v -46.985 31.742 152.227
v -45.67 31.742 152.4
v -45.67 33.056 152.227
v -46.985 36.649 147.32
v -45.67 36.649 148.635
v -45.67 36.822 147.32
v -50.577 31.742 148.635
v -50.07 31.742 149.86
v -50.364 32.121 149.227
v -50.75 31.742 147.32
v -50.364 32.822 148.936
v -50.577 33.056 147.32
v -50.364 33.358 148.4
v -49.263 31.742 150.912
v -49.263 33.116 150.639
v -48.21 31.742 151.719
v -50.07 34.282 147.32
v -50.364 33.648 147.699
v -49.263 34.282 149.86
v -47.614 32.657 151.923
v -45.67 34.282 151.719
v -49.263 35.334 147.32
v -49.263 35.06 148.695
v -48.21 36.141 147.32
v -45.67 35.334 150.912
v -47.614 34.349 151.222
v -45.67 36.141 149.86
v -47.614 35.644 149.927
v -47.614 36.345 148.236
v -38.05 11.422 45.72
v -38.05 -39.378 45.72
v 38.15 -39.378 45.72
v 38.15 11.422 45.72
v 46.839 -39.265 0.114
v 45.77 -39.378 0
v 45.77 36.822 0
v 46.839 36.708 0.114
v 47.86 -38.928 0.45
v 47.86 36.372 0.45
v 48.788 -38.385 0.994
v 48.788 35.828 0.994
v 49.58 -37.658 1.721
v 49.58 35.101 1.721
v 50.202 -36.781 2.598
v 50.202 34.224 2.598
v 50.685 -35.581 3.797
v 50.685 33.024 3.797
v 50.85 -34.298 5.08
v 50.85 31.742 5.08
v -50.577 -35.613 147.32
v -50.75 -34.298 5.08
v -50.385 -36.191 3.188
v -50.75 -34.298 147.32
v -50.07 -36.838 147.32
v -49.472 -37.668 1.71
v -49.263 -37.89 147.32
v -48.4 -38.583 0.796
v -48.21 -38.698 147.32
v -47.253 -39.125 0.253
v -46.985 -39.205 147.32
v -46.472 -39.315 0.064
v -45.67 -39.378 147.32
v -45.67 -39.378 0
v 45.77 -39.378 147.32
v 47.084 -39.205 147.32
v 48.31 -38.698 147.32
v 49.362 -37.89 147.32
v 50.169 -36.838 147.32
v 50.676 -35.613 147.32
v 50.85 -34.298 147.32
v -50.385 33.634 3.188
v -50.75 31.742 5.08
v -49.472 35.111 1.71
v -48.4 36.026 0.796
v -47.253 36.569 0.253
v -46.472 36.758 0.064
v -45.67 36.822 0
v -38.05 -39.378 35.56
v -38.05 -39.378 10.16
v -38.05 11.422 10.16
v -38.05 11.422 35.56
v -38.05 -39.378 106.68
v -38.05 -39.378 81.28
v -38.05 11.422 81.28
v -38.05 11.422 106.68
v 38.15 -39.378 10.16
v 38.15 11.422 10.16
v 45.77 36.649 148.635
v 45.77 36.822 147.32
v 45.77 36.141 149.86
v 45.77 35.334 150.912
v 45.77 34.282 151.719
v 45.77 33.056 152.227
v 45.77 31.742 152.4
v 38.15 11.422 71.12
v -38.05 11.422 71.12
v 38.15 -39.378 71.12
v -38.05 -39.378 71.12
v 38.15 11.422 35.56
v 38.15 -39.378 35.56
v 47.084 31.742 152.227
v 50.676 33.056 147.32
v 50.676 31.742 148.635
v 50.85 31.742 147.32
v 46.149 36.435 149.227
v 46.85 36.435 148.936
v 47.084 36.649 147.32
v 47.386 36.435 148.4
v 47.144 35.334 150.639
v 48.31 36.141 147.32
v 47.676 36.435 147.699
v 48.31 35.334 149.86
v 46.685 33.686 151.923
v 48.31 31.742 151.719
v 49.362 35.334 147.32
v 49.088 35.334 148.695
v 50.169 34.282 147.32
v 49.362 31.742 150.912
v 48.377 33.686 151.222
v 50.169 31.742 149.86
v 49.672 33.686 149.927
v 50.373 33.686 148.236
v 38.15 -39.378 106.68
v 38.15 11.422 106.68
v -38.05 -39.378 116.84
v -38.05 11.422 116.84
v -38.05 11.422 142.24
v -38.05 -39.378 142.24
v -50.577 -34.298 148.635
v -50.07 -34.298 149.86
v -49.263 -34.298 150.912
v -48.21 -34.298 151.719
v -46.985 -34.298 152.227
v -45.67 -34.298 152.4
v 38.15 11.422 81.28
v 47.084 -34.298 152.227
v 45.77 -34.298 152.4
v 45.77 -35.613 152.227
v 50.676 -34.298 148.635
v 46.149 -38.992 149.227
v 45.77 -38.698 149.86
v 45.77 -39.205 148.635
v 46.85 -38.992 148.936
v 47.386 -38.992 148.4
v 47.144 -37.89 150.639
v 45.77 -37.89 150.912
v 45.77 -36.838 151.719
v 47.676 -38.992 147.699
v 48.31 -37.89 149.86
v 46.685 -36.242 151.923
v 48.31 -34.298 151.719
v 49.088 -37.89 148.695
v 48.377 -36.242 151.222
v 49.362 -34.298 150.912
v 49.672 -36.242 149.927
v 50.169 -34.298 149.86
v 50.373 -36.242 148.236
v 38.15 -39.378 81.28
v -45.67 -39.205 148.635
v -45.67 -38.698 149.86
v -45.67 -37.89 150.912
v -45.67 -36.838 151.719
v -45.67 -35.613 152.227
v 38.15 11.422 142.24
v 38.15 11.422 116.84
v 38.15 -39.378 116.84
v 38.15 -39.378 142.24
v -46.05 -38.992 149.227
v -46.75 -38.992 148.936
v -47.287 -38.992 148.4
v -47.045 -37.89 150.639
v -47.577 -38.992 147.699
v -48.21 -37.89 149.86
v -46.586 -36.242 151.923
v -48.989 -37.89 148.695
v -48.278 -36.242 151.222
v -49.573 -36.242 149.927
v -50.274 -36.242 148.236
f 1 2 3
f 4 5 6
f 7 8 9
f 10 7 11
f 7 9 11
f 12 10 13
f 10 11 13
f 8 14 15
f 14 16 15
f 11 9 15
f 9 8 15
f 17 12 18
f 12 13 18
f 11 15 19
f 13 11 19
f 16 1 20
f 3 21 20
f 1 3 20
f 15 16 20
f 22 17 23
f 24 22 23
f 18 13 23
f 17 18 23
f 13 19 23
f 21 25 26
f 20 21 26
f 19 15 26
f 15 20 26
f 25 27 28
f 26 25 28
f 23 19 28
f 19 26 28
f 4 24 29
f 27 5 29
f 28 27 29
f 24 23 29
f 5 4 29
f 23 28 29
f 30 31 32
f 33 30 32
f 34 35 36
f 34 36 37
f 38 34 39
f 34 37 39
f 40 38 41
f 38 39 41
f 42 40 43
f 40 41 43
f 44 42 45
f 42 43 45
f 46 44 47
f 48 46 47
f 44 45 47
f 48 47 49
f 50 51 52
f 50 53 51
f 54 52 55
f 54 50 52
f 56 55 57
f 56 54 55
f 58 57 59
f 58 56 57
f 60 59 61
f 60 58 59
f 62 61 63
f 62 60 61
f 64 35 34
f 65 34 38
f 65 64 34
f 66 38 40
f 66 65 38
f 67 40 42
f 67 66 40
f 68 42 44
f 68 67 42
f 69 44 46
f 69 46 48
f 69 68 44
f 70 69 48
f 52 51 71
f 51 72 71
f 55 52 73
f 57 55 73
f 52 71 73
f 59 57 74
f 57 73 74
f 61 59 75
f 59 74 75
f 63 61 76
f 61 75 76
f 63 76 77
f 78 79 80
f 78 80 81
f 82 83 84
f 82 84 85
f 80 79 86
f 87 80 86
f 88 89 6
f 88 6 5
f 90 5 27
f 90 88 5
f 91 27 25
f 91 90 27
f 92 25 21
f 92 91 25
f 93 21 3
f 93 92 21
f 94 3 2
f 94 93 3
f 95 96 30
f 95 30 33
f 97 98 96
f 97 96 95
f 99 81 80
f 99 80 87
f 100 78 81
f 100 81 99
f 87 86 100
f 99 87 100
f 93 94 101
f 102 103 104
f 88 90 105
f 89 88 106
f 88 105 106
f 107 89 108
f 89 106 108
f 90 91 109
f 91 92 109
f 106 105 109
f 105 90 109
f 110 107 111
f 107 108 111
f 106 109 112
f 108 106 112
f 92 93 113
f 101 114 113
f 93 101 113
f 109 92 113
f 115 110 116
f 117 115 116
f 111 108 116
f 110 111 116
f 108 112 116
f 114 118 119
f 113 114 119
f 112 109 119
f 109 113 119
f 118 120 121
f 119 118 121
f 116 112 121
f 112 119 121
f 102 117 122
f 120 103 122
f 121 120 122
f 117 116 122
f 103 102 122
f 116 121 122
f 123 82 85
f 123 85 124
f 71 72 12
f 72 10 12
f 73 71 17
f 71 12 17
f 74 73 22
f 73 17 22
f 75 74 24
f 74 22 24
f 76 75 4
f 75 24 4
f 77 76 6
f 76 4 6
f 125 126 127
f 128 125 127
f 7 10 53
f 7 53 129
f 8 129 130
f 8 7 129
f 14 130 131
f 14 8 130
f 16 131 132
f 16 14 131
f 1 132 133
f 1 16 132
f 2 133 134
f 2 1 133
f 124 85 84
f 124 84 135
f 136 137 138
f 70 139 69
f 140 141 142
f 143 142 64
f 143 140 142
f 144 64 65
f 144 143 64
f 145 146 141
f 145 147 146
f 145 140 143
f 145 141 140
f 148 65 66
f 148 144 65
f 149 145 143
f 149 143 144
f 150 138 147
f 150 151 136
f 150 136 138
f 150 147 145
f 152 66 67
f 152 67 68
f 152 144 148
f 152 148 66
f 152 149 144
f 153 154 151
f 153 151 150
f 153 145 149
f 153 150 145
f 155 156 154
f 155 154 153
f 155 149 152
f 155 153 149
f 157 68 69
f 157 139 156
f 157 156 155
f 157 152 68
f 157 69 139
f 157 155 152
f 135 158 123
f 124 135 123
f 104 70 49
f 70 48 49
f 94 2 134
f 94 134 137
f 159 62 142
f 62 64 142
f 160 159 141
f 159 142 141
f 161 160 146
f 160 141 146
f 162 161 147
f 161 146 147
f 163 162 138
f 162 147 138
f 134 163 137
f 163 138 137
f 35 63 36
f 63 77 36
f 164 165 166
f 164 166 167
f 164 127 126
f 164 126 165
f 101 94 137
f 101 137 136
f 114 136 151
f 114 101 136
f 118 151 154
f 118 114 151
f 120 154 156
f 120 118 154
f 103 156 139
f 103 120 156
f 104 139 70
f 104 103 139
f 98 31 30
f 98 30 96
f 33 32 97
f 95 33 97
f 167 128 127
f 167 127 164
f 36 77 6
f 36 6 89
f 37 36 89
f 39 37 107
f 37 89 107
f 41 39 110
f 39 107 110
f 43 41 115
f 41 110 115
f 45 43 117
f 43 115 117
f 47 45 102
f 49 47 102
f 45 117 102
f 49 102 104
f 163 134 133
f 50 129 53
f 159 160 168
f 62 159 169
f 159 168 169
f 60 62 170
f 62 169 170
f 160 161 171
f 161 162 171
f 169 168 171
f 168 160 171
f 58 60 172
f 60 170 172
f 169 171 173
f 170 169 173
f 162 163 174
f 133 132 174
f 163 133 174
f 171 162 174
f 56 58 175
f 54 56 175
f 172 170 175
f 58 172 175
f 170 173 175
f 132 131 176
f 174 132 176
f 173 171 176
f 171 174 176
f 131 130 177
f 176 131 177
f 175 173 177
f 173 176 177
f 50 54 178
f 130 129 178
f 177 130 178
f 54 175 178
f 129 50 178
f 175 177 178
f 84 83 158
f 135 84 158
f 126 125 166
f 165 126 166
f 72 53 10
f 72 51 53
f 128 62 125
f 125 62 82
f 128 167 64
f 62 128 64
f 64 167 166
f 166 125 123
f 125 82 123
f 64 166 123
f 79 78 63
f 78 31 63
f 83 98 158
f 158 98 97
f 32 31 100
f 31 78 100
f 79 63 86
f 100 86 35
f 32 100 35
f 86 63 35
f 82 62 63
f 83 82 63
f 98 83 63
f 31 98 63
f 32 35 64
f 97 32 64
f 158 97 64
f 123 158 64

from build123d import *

# Parameters (mm, degrees)
F0_W     = 101.6
F0_H     = 76.2
F1_DEPTH = 152.4
F2_W     = 76.2
F2_H     = 25.4
F3_DEPTH = 50.8
F4_R     = 5.08


with BuildPart() as f1:
    # F0 (on Top) → F1 (new body)
    with BuildSketch(Plane.XY):
        with Locations((0.049565, -1.278337)):
            Rectangle(F0_W, F0_H)
    extrude(amount=F1_DEPTH)

    # F2 (on face) → F3 (cut)
    with BuildSketch(Plane.XZ.offset(39.378337)):
        with Locations((0.049565, 129.54)):
            Rectangle(F2_W, F2_H)
        with Locations((0.049565, 93.98)):
            Rectangle(F2_W, F2_H)
        with Locations((0.049565, 58.42)):
            Rectangle(F2_W, F2_H)
        with Locations((0.049565, 22.86)):
            Rectangle(F2_W, F2_H)
    extrude(amount=-F3_DEPTH, mode=Mode.SUBTRACT)

    # F4
    f4_edges = [f1.edges().sort_by_distance(p)[0] for p in [
        (50.849565, -1.278337, 152.4),
        (0.049565, 36.821663, 152.4),
        (-50.750435, -1.278337, 152.4),
        (0.049565, -39.378337, 152.4),
        (50.849565, -39.378337, 76.2),
        (50.849565, 36.821663, 76.2),
        (50.849565, -1.278337, 0),
        (-50.750435, 36.821663, 76.2),
        (-50.750435, -39.378337, 76.2),
        (-50.750435, -1.278337, 0),
    ]]
    fillet(f4_edges, radius=F4_R)


solid = f1.part
